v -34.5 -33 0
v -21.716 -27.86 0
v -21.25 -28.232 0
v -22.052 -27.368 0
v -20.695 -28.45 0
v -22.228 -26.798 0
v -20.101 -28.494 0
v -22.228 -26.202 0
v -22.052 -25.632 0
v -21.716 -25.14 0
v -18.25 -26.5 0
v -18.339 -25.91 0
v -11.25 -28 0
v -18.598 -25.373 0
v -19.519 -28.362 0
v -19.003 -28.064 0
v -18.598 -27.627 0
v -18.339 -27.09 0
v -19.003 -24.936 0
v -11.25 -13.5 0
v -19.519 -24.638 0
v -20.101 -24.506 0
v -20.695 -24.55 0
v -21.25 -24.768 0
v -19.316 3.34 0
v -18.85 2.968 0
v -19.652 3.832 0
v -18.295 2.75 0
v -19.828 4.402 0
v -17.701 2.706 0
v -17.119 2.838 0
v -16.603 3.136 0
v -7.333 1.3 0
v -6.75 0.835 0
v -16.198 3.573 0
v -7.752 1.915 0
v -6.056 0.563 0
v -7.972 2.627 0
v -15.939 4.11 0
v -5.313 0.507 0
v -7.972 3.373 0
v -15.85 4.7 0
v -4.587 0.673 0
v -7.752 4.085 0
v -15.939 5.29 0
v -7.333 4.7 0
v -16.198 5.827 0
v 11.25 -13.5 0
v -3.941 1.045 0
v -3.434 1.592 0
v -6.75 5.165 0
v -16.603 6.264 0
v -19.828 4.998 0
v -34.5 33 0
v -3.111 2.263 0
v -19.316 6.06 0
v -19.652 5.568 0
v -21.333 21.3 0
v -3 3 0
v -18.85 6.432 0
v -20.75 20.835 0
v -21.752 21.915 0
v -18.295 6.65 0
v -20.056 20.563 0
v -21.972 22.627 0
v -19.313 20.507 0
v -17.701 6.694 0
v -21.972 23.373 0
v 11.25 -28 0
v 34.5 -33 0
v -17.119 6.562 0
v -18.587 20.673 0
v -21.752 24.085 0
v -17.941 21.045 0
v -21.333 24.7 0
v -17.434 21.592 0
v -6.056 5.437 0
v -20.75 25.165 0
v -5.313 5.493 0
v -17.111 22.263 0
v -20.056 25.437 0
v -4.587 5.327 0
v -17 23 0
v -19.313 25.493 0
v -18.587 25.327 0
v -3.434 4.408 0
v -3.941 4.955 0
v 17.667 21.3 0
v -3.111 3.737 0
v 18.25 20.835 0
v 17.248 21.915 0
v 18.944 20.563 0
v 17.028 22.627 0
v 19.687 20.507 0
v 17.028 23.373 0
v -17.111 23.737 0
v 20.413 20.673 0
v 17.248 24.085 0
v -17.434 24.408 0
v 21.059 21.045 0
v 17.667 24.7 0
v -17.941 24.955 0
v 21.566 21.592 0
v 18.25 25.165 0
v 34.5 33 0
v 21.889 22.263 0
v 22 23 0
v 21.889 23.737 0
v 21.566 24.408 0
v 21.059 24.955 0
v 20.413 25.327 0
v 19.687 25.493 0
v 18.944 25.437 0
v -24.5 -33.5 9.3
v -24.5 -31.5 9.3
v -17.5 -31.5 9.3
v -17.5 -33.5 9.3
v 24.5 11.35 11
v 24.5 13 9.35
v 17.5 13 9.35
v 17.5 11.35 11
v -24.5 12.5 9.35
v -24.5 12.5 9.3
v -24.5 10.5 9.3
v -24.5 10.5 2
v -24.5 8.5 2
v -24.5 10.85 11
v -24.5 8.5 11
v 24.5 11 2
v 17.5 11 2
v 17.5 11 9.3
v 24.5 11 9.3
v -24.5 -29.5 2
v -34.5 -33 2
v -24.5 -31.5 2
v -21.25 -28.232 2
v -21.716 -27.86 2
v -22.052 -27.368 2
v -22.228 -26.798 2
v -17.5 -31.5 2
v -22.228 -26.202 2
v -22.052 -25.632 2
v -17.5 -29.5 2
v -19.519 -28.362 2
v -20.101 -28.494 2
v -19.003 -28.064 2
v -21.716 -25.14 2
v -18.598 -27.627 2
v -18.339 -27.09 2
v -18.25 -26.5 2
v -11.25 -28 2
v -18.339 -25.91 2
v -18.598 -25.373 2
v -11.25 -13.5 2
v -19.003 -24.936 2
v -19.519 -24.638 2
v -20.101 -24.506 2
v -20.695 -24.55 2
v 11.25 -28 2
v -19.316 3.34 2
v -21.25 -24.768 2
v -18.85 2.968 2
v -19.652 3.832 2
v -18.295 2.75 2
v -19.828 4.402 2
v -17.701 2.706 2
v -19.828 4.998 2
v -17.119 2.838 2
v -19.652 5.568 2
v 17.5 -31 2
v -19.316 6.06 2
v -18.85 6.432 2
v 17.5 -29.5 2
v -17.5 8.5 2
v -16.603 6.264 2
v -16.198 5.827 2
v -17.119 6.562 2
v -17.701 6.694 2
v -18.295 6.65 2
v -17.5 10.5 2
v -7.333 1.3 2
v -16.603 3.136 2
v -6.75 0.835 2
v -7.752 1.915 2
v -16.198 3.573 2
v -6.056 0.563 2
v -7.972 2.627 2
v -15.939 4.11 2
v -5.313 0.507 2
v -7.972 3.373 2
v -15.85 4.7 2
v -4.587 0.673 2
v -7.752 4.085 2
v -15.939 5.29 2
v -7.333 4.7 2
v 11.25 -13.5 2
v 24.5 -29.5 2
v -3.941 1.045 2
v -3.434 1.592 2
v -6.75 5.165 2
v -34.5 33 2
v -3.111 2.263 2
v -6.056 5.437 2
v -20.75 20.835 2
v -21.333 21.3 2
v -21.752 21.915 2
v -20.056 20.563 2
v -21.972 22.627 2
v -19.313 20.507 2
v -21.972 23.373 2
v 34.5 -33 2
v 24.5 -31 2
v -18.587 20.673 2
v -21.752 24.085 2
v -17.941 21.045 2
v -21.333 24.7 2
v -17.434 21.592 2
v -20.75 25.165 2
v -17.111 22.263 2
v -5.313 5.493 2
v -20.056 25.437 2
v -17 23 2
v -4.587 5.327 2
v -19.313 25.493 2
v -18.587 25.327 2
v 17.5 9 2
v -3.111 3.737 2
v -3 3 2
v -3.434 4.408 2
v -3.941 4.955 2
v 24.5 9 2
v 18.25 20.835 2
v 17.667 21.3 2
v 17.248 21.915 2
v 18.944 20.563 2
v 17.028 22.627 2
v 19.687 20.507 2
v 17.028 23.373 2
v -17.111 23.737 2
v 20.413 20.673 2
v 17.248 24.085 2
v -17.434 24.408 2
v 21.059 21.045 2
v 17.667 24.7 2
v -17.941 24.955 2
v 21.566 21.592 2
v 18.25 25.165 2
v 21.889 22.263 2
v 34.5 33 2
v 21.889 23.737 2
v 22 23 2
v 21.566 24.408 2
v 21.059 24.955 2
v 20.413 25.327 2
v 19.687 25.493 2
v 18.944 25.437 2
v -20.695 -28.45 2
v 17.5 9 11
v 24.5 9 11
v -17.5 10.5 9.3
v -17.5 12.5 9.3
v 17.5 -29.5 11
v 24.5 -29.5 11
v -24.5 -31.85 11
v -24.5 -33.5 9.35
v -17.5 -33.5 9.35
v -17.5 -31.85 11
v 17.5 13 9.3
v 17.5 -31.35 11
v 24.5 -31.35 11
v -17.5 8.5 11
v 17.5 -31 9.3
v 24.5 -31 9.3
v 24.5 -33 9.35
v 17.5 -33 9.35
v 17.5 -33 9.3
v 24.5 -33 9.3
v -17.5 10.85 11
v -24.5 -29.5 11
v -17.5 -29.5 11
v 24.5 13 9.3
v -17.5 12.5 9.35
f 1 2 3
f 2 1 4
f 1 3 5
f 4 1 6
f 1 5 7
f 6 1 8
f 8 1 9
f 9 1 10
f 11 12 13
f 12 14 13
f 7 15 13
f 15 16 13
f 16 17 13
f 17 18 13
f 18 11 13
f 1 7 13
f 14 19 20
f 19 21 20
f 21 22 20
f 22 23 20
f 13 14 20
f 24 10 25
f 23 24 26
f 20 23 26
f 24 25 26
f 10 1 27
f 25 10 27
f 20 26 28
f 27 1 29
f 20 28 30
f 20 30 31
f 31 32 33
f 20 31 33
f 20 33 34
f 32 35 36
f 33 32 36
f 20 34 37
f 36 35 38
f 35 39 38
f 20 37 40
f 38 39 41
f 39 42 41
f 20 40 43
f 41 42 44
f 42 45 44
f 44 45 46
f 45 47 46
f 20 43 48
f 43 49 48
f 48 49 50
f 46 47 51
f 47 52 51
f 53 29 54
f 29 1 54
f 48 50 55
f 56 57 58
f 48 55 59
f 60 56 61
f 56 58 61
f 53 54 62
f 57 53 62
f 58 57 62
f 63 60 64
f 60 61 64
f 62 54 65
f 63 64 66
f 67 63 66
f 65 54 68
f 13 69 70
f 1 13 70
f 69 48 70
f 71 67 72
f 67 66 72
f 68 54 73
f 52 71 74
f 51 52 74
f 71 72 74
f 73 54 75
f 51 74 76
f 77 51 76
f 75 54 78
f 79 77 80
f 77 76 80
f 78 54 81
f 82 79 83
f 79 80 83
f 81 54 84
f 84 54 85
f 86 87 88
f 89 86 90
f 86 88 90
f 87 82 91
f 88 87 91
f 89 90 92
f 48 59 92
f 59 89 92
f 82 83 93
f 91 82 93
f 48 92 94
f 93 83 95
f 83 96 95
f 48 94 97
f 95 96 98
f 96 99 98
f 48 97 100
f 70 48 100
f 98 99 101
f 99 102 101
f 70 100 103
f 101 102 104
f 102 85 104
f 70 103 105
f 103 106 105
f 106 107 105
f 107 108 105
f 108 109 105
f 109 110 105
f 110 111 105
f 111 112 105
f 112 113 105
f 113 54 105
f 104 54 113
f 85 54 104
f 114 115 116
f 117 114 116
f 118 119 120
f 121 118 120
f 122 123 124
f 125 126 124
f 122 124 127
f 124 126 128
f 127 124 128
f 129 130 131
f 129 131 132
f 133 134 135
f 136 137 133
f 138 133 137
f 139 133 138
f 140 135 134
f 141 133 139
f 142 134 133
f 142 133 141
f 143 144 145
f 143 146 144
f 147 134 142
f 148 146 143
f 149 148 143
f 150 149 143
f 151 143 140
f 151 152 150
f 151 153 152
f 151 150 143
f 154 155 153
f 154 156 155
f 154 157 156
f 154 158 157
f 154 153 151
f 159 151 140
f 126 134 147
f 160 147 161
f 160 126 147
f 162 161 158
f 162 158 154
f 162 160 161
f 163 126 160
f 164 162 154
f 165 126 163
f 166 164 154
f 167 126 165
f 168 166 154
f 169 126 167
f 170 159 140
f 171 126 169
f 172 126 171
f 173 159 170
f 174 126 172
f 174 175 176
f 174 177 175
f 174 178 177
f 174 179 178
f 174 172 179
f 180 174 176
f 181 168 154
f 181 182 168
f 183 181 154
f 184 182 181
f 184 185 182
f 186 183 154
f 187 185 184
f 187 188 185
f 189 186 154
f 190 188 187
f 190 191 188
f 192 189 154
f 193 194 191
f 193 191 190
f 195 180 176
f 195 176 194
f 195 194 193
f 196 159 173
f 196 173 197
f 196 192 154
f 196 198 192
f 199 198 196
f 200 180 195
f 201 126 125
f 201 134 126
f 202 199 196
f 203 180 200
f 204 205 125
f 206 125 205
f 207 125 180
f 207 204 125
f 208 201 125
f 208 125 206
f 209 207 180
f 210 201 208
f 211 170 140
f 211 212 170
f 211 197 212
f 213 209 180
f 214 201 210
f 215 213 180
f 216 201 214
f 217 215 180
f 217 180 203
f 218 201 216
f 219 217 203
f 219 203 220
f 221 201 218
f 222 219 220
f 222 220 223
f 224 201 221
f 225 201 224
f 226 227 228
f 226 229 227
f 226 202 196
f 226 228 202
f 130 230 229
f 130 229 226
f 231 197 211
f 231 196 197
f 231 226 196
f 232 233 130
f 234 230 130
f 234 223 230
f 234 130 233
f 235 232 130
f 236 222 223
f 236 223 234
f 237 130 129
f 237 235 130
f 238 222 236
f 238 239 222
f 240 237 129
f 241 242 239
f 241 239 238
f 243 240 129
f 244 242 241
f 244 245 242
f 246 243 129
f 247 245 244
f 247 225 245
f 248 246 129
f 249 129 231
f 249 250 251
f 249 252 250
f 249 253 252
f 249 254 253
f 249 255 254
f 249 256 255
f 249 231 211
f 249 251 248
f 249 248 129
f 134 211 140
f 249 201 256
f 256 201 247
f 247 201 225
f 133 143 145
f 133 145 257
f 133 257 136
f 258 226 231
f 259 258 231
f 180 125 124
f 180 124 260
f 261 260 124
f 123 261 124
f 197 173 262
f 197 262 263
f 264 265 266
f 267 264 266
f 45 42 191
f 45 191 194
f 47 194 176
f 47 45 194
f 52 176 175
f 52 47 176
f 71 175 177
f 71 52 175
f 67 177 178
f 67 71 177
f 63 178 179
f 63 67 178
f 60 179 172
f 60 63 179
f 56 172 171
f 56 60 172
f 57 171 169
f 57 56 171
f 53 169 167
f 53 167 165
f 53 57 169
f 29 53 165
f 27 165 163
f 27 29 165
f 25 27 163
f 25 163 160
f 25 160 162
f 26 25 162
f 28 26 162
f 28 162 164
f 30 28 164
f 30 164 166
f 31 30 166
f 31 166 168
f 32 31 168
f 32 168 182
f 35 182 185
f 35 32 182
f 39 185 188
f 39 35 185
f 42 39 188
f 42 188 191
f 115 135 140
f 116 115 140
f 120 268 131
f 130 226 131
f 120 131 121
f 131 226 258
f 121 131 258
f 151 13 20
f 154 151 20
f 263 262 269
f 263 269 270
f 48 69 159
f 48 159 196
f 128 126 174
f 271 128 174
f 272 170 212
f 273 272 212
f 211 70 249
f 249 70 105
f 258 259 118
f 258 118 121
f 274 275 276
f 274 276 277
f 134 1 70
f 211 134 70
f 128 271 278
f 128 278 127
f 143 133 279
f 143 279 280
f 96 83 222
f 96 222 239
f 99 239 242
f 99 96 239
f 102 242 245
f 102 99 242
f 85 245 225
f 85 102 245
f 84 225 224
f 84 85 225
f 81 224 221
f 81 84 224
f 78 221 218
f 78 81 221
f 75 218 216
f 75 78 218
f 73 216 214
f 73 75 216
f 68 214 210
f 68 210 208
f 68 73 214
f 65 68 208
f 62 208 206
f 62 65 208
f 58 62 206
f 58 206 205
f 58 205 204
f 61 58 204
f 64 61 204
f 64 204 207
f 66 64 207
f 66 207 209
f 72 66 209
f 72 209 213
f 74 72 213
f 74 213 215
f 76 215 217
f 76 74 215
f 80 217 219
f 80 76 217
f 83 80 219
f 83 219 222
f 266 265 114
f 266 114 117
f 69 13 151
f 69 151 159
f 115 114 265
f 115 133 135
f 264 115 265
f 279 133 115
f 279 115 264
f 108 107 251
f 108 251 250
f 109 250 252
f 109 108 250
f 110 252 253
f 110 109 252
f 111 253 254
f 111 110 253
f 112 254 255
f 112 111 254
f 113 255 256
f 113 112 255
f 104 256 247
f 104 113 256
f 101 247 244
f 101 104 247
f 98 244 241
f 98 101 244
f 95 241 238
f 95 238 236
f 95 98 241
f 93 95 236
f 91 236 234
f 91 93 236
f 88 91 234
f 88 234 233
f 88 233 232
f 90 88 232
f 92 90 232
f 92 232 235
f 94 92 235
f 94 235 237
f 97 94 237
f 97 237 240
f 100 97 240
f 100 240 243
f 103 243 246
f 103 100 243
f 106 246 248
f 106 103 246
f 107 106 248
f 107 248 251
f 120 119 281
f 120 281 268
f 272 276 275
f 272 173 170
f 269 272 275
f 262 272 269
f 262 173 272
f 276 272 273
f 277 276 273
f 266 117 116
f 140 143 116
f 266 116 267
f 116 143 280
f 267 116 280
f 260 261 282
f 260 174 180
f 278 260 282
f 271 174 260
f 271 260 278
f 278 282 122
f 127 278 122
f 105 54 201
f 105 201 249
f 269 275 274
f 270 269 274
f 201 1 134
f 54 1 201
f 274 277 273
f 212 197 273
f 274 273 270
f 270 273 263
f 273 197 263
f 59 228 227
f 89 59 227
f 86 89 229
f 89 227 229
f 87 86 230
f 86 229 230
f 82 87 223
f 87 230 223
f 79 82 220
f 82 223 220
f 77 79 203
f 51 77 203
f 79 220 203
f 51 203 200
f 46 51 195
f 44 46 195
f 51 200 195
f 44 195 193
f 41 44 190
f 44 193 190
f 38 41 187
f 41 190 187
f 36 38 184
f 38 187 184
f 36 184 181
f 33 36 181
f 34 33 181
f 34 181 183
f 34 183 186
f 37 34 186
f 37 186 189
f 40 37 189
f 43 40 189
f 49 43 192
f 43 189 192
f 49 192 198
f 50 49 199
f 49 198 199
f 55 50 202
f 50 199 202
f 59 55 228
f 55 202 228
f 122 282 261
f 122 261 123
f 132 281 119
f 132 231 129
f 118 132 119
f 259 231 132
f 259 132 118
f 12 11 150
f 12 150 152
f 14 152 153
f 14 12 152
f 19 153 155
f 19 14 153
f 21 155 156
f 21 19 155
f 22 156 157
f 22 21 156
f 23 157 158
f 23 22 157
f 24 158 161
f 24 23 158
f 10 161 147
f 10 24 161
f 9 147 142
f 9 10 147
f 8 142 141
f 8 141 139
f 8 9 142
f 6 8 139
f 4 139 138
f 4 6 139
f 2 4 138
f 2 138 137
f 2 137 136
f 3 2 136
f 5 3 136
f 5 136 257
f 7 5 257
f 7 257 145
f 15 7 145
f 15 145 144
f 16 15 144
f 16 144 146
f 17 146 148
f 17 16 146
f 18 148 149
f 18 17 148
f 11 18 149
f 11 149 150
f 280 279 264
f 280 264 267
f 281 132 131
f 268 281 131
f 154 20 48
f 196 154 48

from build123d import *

# Parameters (mm, degrees)
SKETCH_W        = 69
SKETCH_H        = 66
SKETCH_R        = 2.5
SKETCH_R_2      = 2
SKETCH_W_2      = 22.5
SKETCH_H_2      = 14.5
PAD_DEPTH       = 2
SKETCH011_R     = 2.5
POCKET_DEPTH    = 2
SKETCH012_W     = 7
SKETCH012_H     = 2
SKETCH012_H_2   = 1.5
PAD001_DEPTH    = 9
SKETCH013_W     = 7
SKETCH013_H     = 1.7
PAD002_DEPTH    = 2
CHAMFER_SIZE    = 1.65
SKETCH014_W     = 7
SKETCH014_H     = 1.7
PAD003_DEPTH    = 2
CHAMFER001_SIZE = 1.65
SKETCH015_W     = 7
SKETCH015_H     = 1.7
PAD004_DEPTH    = 2
CHAMFER002_SIZE = 1.65
SKETCH016_W     = 7
SKETCH016_H     = 1.7
PAD005_DEPTH    = 2
CHAMFER003_SIZE = 1.65


with BuildPart() as part:
    # Sketch → Pad (new body)
    with BuildSketch(Plane.XY):
        Rectangle(SKETCH_W, SKETCH_H)
        with Locations((-19.5, 23)):
            Circle(SKETCH_R, mode=Mode.SUBTRACT)
        with Locations((19.5, 23)):
            Circle(SKETCH_R, mode=Mode.SUBTRACT)
        with Locations((-20.25, -26.5)):
            Circle(SKETCH_R_2, mode=Mode.SUBTRACT)
        with Locations((-17.85, 4.7)):
            Circle(SKETCH_R_2, mode=Mode.SUBTRACT)
        with Locations((0, -20.75)):
            Rectangle(SKETCH_W_2, SKETCH_H_2, mode=Mode.SUBTRACT)
    extrude(amount=PAD_DEPTH)

    # Sketch011 → Pocket (cut)
    with BuildSketch(Plane.XY.offset(2)):
        with Locations((-5.5, 3)):
            Circle(SKETCH011_R)
    extrude(amount=-POCKET_DEPTH, mode=Mode.SUBTRACT)

    # Sketch012 (on Face5 of Pocket) → Pad001 (join)
    with BuildSketch(Plane.XY.offset(2)):
        with Locations((-21, 9.5)):
            Rectangle(SKETCH012_W, SKETCH012_H)
        with Locations((21, -30.25)):
            Rectangle(SKETCH012_W, SKETCH012_H_2)
        with Locations((21, 10)):
            Rectangle(SKETCH012_W, SKETCH012_H)
        with Locations((-21, -30.5)):
            Rectangle(SKETCH012_W, SKETCH012_H)
    extrude(amount=PAD001_DEPTH)

    # Sketch013 (on Face22 of Pad001) → Pad002 (join)
    with BuildSketch(Plane.XZ.offset(31.5)):
        with Locations((-21, 10.15)):
            Rectangle(SKETCH013_W, SKETCH013_H)
    extrude(amount=PAD002_DEPTH)

    # Chamfer
    chamfer_edges = [part.edges().sort_by_distance(p)[0] for p in [
        (-21, -33.5, 11),
    ]]
    chamfer(chamfer_edges, length=CHAMFER_SIZE)

    # Sketch014 (on Face32 of Chamfer) → Pad003 (join)
    with BuildSketch(Plane.XZ.offset(31)):
        with Locations((21, 10.15)):
            Rectangle(SKETCH014_W, SKETCH014_H)
    extrude(amount=PAD003_DEPTH)

    # Chamfer001
    chamfer001_edges = [part.edges().sort_by_distance(p)[0] for p in [
        (21, -33, 11),
    ]]
    chamfer(chamfer001_edges, length=CHAMFER001_SIZE)

    # Sketch015 (on Face16 of Pad001) → Pad004 (join)
    with BuildSketch(Plane(origin=(0, 11, 0), x_dir=(-1, 0, 0), z_dir=(0, 1, 0))):
        with Locations((-21, 10.15)):
            Rectangle(SKETCH015_W, SKETCH015_H)
    extrude(amount=PAD004_DEPTH)

    # Chamfer002
    chamfer002_edges = [part.edges().sort_by_distance(p)[0] for p in [
        (21, 13, 11),
    ]]
    chamfer(chamfer002_edges, length=CHAMFER002_SIZE)

    # Sketch016 (on Face24 of Chamfer002) → Pad005 (join)
    with BuildSketch(Plane(origin=(0, 10.5, 0), x_dir=(-1, 0, 0), z_dir=(0, 1, 0))):
        with Locations((21, 10.15)):
            Rectangle(SKETCH016_W, SKETCH016_H)
    extrude(amount=PAD005_DEPTH)

    # Chamfer003
    chamfer003_edges = [part.edges().sort_by_distance(p)[0] for p in [
        (-21, 12.5, 11),
    ]]
    chamfer(chamfer003_edges, length=CHAMFER003_SIZE)


solid = part.part
